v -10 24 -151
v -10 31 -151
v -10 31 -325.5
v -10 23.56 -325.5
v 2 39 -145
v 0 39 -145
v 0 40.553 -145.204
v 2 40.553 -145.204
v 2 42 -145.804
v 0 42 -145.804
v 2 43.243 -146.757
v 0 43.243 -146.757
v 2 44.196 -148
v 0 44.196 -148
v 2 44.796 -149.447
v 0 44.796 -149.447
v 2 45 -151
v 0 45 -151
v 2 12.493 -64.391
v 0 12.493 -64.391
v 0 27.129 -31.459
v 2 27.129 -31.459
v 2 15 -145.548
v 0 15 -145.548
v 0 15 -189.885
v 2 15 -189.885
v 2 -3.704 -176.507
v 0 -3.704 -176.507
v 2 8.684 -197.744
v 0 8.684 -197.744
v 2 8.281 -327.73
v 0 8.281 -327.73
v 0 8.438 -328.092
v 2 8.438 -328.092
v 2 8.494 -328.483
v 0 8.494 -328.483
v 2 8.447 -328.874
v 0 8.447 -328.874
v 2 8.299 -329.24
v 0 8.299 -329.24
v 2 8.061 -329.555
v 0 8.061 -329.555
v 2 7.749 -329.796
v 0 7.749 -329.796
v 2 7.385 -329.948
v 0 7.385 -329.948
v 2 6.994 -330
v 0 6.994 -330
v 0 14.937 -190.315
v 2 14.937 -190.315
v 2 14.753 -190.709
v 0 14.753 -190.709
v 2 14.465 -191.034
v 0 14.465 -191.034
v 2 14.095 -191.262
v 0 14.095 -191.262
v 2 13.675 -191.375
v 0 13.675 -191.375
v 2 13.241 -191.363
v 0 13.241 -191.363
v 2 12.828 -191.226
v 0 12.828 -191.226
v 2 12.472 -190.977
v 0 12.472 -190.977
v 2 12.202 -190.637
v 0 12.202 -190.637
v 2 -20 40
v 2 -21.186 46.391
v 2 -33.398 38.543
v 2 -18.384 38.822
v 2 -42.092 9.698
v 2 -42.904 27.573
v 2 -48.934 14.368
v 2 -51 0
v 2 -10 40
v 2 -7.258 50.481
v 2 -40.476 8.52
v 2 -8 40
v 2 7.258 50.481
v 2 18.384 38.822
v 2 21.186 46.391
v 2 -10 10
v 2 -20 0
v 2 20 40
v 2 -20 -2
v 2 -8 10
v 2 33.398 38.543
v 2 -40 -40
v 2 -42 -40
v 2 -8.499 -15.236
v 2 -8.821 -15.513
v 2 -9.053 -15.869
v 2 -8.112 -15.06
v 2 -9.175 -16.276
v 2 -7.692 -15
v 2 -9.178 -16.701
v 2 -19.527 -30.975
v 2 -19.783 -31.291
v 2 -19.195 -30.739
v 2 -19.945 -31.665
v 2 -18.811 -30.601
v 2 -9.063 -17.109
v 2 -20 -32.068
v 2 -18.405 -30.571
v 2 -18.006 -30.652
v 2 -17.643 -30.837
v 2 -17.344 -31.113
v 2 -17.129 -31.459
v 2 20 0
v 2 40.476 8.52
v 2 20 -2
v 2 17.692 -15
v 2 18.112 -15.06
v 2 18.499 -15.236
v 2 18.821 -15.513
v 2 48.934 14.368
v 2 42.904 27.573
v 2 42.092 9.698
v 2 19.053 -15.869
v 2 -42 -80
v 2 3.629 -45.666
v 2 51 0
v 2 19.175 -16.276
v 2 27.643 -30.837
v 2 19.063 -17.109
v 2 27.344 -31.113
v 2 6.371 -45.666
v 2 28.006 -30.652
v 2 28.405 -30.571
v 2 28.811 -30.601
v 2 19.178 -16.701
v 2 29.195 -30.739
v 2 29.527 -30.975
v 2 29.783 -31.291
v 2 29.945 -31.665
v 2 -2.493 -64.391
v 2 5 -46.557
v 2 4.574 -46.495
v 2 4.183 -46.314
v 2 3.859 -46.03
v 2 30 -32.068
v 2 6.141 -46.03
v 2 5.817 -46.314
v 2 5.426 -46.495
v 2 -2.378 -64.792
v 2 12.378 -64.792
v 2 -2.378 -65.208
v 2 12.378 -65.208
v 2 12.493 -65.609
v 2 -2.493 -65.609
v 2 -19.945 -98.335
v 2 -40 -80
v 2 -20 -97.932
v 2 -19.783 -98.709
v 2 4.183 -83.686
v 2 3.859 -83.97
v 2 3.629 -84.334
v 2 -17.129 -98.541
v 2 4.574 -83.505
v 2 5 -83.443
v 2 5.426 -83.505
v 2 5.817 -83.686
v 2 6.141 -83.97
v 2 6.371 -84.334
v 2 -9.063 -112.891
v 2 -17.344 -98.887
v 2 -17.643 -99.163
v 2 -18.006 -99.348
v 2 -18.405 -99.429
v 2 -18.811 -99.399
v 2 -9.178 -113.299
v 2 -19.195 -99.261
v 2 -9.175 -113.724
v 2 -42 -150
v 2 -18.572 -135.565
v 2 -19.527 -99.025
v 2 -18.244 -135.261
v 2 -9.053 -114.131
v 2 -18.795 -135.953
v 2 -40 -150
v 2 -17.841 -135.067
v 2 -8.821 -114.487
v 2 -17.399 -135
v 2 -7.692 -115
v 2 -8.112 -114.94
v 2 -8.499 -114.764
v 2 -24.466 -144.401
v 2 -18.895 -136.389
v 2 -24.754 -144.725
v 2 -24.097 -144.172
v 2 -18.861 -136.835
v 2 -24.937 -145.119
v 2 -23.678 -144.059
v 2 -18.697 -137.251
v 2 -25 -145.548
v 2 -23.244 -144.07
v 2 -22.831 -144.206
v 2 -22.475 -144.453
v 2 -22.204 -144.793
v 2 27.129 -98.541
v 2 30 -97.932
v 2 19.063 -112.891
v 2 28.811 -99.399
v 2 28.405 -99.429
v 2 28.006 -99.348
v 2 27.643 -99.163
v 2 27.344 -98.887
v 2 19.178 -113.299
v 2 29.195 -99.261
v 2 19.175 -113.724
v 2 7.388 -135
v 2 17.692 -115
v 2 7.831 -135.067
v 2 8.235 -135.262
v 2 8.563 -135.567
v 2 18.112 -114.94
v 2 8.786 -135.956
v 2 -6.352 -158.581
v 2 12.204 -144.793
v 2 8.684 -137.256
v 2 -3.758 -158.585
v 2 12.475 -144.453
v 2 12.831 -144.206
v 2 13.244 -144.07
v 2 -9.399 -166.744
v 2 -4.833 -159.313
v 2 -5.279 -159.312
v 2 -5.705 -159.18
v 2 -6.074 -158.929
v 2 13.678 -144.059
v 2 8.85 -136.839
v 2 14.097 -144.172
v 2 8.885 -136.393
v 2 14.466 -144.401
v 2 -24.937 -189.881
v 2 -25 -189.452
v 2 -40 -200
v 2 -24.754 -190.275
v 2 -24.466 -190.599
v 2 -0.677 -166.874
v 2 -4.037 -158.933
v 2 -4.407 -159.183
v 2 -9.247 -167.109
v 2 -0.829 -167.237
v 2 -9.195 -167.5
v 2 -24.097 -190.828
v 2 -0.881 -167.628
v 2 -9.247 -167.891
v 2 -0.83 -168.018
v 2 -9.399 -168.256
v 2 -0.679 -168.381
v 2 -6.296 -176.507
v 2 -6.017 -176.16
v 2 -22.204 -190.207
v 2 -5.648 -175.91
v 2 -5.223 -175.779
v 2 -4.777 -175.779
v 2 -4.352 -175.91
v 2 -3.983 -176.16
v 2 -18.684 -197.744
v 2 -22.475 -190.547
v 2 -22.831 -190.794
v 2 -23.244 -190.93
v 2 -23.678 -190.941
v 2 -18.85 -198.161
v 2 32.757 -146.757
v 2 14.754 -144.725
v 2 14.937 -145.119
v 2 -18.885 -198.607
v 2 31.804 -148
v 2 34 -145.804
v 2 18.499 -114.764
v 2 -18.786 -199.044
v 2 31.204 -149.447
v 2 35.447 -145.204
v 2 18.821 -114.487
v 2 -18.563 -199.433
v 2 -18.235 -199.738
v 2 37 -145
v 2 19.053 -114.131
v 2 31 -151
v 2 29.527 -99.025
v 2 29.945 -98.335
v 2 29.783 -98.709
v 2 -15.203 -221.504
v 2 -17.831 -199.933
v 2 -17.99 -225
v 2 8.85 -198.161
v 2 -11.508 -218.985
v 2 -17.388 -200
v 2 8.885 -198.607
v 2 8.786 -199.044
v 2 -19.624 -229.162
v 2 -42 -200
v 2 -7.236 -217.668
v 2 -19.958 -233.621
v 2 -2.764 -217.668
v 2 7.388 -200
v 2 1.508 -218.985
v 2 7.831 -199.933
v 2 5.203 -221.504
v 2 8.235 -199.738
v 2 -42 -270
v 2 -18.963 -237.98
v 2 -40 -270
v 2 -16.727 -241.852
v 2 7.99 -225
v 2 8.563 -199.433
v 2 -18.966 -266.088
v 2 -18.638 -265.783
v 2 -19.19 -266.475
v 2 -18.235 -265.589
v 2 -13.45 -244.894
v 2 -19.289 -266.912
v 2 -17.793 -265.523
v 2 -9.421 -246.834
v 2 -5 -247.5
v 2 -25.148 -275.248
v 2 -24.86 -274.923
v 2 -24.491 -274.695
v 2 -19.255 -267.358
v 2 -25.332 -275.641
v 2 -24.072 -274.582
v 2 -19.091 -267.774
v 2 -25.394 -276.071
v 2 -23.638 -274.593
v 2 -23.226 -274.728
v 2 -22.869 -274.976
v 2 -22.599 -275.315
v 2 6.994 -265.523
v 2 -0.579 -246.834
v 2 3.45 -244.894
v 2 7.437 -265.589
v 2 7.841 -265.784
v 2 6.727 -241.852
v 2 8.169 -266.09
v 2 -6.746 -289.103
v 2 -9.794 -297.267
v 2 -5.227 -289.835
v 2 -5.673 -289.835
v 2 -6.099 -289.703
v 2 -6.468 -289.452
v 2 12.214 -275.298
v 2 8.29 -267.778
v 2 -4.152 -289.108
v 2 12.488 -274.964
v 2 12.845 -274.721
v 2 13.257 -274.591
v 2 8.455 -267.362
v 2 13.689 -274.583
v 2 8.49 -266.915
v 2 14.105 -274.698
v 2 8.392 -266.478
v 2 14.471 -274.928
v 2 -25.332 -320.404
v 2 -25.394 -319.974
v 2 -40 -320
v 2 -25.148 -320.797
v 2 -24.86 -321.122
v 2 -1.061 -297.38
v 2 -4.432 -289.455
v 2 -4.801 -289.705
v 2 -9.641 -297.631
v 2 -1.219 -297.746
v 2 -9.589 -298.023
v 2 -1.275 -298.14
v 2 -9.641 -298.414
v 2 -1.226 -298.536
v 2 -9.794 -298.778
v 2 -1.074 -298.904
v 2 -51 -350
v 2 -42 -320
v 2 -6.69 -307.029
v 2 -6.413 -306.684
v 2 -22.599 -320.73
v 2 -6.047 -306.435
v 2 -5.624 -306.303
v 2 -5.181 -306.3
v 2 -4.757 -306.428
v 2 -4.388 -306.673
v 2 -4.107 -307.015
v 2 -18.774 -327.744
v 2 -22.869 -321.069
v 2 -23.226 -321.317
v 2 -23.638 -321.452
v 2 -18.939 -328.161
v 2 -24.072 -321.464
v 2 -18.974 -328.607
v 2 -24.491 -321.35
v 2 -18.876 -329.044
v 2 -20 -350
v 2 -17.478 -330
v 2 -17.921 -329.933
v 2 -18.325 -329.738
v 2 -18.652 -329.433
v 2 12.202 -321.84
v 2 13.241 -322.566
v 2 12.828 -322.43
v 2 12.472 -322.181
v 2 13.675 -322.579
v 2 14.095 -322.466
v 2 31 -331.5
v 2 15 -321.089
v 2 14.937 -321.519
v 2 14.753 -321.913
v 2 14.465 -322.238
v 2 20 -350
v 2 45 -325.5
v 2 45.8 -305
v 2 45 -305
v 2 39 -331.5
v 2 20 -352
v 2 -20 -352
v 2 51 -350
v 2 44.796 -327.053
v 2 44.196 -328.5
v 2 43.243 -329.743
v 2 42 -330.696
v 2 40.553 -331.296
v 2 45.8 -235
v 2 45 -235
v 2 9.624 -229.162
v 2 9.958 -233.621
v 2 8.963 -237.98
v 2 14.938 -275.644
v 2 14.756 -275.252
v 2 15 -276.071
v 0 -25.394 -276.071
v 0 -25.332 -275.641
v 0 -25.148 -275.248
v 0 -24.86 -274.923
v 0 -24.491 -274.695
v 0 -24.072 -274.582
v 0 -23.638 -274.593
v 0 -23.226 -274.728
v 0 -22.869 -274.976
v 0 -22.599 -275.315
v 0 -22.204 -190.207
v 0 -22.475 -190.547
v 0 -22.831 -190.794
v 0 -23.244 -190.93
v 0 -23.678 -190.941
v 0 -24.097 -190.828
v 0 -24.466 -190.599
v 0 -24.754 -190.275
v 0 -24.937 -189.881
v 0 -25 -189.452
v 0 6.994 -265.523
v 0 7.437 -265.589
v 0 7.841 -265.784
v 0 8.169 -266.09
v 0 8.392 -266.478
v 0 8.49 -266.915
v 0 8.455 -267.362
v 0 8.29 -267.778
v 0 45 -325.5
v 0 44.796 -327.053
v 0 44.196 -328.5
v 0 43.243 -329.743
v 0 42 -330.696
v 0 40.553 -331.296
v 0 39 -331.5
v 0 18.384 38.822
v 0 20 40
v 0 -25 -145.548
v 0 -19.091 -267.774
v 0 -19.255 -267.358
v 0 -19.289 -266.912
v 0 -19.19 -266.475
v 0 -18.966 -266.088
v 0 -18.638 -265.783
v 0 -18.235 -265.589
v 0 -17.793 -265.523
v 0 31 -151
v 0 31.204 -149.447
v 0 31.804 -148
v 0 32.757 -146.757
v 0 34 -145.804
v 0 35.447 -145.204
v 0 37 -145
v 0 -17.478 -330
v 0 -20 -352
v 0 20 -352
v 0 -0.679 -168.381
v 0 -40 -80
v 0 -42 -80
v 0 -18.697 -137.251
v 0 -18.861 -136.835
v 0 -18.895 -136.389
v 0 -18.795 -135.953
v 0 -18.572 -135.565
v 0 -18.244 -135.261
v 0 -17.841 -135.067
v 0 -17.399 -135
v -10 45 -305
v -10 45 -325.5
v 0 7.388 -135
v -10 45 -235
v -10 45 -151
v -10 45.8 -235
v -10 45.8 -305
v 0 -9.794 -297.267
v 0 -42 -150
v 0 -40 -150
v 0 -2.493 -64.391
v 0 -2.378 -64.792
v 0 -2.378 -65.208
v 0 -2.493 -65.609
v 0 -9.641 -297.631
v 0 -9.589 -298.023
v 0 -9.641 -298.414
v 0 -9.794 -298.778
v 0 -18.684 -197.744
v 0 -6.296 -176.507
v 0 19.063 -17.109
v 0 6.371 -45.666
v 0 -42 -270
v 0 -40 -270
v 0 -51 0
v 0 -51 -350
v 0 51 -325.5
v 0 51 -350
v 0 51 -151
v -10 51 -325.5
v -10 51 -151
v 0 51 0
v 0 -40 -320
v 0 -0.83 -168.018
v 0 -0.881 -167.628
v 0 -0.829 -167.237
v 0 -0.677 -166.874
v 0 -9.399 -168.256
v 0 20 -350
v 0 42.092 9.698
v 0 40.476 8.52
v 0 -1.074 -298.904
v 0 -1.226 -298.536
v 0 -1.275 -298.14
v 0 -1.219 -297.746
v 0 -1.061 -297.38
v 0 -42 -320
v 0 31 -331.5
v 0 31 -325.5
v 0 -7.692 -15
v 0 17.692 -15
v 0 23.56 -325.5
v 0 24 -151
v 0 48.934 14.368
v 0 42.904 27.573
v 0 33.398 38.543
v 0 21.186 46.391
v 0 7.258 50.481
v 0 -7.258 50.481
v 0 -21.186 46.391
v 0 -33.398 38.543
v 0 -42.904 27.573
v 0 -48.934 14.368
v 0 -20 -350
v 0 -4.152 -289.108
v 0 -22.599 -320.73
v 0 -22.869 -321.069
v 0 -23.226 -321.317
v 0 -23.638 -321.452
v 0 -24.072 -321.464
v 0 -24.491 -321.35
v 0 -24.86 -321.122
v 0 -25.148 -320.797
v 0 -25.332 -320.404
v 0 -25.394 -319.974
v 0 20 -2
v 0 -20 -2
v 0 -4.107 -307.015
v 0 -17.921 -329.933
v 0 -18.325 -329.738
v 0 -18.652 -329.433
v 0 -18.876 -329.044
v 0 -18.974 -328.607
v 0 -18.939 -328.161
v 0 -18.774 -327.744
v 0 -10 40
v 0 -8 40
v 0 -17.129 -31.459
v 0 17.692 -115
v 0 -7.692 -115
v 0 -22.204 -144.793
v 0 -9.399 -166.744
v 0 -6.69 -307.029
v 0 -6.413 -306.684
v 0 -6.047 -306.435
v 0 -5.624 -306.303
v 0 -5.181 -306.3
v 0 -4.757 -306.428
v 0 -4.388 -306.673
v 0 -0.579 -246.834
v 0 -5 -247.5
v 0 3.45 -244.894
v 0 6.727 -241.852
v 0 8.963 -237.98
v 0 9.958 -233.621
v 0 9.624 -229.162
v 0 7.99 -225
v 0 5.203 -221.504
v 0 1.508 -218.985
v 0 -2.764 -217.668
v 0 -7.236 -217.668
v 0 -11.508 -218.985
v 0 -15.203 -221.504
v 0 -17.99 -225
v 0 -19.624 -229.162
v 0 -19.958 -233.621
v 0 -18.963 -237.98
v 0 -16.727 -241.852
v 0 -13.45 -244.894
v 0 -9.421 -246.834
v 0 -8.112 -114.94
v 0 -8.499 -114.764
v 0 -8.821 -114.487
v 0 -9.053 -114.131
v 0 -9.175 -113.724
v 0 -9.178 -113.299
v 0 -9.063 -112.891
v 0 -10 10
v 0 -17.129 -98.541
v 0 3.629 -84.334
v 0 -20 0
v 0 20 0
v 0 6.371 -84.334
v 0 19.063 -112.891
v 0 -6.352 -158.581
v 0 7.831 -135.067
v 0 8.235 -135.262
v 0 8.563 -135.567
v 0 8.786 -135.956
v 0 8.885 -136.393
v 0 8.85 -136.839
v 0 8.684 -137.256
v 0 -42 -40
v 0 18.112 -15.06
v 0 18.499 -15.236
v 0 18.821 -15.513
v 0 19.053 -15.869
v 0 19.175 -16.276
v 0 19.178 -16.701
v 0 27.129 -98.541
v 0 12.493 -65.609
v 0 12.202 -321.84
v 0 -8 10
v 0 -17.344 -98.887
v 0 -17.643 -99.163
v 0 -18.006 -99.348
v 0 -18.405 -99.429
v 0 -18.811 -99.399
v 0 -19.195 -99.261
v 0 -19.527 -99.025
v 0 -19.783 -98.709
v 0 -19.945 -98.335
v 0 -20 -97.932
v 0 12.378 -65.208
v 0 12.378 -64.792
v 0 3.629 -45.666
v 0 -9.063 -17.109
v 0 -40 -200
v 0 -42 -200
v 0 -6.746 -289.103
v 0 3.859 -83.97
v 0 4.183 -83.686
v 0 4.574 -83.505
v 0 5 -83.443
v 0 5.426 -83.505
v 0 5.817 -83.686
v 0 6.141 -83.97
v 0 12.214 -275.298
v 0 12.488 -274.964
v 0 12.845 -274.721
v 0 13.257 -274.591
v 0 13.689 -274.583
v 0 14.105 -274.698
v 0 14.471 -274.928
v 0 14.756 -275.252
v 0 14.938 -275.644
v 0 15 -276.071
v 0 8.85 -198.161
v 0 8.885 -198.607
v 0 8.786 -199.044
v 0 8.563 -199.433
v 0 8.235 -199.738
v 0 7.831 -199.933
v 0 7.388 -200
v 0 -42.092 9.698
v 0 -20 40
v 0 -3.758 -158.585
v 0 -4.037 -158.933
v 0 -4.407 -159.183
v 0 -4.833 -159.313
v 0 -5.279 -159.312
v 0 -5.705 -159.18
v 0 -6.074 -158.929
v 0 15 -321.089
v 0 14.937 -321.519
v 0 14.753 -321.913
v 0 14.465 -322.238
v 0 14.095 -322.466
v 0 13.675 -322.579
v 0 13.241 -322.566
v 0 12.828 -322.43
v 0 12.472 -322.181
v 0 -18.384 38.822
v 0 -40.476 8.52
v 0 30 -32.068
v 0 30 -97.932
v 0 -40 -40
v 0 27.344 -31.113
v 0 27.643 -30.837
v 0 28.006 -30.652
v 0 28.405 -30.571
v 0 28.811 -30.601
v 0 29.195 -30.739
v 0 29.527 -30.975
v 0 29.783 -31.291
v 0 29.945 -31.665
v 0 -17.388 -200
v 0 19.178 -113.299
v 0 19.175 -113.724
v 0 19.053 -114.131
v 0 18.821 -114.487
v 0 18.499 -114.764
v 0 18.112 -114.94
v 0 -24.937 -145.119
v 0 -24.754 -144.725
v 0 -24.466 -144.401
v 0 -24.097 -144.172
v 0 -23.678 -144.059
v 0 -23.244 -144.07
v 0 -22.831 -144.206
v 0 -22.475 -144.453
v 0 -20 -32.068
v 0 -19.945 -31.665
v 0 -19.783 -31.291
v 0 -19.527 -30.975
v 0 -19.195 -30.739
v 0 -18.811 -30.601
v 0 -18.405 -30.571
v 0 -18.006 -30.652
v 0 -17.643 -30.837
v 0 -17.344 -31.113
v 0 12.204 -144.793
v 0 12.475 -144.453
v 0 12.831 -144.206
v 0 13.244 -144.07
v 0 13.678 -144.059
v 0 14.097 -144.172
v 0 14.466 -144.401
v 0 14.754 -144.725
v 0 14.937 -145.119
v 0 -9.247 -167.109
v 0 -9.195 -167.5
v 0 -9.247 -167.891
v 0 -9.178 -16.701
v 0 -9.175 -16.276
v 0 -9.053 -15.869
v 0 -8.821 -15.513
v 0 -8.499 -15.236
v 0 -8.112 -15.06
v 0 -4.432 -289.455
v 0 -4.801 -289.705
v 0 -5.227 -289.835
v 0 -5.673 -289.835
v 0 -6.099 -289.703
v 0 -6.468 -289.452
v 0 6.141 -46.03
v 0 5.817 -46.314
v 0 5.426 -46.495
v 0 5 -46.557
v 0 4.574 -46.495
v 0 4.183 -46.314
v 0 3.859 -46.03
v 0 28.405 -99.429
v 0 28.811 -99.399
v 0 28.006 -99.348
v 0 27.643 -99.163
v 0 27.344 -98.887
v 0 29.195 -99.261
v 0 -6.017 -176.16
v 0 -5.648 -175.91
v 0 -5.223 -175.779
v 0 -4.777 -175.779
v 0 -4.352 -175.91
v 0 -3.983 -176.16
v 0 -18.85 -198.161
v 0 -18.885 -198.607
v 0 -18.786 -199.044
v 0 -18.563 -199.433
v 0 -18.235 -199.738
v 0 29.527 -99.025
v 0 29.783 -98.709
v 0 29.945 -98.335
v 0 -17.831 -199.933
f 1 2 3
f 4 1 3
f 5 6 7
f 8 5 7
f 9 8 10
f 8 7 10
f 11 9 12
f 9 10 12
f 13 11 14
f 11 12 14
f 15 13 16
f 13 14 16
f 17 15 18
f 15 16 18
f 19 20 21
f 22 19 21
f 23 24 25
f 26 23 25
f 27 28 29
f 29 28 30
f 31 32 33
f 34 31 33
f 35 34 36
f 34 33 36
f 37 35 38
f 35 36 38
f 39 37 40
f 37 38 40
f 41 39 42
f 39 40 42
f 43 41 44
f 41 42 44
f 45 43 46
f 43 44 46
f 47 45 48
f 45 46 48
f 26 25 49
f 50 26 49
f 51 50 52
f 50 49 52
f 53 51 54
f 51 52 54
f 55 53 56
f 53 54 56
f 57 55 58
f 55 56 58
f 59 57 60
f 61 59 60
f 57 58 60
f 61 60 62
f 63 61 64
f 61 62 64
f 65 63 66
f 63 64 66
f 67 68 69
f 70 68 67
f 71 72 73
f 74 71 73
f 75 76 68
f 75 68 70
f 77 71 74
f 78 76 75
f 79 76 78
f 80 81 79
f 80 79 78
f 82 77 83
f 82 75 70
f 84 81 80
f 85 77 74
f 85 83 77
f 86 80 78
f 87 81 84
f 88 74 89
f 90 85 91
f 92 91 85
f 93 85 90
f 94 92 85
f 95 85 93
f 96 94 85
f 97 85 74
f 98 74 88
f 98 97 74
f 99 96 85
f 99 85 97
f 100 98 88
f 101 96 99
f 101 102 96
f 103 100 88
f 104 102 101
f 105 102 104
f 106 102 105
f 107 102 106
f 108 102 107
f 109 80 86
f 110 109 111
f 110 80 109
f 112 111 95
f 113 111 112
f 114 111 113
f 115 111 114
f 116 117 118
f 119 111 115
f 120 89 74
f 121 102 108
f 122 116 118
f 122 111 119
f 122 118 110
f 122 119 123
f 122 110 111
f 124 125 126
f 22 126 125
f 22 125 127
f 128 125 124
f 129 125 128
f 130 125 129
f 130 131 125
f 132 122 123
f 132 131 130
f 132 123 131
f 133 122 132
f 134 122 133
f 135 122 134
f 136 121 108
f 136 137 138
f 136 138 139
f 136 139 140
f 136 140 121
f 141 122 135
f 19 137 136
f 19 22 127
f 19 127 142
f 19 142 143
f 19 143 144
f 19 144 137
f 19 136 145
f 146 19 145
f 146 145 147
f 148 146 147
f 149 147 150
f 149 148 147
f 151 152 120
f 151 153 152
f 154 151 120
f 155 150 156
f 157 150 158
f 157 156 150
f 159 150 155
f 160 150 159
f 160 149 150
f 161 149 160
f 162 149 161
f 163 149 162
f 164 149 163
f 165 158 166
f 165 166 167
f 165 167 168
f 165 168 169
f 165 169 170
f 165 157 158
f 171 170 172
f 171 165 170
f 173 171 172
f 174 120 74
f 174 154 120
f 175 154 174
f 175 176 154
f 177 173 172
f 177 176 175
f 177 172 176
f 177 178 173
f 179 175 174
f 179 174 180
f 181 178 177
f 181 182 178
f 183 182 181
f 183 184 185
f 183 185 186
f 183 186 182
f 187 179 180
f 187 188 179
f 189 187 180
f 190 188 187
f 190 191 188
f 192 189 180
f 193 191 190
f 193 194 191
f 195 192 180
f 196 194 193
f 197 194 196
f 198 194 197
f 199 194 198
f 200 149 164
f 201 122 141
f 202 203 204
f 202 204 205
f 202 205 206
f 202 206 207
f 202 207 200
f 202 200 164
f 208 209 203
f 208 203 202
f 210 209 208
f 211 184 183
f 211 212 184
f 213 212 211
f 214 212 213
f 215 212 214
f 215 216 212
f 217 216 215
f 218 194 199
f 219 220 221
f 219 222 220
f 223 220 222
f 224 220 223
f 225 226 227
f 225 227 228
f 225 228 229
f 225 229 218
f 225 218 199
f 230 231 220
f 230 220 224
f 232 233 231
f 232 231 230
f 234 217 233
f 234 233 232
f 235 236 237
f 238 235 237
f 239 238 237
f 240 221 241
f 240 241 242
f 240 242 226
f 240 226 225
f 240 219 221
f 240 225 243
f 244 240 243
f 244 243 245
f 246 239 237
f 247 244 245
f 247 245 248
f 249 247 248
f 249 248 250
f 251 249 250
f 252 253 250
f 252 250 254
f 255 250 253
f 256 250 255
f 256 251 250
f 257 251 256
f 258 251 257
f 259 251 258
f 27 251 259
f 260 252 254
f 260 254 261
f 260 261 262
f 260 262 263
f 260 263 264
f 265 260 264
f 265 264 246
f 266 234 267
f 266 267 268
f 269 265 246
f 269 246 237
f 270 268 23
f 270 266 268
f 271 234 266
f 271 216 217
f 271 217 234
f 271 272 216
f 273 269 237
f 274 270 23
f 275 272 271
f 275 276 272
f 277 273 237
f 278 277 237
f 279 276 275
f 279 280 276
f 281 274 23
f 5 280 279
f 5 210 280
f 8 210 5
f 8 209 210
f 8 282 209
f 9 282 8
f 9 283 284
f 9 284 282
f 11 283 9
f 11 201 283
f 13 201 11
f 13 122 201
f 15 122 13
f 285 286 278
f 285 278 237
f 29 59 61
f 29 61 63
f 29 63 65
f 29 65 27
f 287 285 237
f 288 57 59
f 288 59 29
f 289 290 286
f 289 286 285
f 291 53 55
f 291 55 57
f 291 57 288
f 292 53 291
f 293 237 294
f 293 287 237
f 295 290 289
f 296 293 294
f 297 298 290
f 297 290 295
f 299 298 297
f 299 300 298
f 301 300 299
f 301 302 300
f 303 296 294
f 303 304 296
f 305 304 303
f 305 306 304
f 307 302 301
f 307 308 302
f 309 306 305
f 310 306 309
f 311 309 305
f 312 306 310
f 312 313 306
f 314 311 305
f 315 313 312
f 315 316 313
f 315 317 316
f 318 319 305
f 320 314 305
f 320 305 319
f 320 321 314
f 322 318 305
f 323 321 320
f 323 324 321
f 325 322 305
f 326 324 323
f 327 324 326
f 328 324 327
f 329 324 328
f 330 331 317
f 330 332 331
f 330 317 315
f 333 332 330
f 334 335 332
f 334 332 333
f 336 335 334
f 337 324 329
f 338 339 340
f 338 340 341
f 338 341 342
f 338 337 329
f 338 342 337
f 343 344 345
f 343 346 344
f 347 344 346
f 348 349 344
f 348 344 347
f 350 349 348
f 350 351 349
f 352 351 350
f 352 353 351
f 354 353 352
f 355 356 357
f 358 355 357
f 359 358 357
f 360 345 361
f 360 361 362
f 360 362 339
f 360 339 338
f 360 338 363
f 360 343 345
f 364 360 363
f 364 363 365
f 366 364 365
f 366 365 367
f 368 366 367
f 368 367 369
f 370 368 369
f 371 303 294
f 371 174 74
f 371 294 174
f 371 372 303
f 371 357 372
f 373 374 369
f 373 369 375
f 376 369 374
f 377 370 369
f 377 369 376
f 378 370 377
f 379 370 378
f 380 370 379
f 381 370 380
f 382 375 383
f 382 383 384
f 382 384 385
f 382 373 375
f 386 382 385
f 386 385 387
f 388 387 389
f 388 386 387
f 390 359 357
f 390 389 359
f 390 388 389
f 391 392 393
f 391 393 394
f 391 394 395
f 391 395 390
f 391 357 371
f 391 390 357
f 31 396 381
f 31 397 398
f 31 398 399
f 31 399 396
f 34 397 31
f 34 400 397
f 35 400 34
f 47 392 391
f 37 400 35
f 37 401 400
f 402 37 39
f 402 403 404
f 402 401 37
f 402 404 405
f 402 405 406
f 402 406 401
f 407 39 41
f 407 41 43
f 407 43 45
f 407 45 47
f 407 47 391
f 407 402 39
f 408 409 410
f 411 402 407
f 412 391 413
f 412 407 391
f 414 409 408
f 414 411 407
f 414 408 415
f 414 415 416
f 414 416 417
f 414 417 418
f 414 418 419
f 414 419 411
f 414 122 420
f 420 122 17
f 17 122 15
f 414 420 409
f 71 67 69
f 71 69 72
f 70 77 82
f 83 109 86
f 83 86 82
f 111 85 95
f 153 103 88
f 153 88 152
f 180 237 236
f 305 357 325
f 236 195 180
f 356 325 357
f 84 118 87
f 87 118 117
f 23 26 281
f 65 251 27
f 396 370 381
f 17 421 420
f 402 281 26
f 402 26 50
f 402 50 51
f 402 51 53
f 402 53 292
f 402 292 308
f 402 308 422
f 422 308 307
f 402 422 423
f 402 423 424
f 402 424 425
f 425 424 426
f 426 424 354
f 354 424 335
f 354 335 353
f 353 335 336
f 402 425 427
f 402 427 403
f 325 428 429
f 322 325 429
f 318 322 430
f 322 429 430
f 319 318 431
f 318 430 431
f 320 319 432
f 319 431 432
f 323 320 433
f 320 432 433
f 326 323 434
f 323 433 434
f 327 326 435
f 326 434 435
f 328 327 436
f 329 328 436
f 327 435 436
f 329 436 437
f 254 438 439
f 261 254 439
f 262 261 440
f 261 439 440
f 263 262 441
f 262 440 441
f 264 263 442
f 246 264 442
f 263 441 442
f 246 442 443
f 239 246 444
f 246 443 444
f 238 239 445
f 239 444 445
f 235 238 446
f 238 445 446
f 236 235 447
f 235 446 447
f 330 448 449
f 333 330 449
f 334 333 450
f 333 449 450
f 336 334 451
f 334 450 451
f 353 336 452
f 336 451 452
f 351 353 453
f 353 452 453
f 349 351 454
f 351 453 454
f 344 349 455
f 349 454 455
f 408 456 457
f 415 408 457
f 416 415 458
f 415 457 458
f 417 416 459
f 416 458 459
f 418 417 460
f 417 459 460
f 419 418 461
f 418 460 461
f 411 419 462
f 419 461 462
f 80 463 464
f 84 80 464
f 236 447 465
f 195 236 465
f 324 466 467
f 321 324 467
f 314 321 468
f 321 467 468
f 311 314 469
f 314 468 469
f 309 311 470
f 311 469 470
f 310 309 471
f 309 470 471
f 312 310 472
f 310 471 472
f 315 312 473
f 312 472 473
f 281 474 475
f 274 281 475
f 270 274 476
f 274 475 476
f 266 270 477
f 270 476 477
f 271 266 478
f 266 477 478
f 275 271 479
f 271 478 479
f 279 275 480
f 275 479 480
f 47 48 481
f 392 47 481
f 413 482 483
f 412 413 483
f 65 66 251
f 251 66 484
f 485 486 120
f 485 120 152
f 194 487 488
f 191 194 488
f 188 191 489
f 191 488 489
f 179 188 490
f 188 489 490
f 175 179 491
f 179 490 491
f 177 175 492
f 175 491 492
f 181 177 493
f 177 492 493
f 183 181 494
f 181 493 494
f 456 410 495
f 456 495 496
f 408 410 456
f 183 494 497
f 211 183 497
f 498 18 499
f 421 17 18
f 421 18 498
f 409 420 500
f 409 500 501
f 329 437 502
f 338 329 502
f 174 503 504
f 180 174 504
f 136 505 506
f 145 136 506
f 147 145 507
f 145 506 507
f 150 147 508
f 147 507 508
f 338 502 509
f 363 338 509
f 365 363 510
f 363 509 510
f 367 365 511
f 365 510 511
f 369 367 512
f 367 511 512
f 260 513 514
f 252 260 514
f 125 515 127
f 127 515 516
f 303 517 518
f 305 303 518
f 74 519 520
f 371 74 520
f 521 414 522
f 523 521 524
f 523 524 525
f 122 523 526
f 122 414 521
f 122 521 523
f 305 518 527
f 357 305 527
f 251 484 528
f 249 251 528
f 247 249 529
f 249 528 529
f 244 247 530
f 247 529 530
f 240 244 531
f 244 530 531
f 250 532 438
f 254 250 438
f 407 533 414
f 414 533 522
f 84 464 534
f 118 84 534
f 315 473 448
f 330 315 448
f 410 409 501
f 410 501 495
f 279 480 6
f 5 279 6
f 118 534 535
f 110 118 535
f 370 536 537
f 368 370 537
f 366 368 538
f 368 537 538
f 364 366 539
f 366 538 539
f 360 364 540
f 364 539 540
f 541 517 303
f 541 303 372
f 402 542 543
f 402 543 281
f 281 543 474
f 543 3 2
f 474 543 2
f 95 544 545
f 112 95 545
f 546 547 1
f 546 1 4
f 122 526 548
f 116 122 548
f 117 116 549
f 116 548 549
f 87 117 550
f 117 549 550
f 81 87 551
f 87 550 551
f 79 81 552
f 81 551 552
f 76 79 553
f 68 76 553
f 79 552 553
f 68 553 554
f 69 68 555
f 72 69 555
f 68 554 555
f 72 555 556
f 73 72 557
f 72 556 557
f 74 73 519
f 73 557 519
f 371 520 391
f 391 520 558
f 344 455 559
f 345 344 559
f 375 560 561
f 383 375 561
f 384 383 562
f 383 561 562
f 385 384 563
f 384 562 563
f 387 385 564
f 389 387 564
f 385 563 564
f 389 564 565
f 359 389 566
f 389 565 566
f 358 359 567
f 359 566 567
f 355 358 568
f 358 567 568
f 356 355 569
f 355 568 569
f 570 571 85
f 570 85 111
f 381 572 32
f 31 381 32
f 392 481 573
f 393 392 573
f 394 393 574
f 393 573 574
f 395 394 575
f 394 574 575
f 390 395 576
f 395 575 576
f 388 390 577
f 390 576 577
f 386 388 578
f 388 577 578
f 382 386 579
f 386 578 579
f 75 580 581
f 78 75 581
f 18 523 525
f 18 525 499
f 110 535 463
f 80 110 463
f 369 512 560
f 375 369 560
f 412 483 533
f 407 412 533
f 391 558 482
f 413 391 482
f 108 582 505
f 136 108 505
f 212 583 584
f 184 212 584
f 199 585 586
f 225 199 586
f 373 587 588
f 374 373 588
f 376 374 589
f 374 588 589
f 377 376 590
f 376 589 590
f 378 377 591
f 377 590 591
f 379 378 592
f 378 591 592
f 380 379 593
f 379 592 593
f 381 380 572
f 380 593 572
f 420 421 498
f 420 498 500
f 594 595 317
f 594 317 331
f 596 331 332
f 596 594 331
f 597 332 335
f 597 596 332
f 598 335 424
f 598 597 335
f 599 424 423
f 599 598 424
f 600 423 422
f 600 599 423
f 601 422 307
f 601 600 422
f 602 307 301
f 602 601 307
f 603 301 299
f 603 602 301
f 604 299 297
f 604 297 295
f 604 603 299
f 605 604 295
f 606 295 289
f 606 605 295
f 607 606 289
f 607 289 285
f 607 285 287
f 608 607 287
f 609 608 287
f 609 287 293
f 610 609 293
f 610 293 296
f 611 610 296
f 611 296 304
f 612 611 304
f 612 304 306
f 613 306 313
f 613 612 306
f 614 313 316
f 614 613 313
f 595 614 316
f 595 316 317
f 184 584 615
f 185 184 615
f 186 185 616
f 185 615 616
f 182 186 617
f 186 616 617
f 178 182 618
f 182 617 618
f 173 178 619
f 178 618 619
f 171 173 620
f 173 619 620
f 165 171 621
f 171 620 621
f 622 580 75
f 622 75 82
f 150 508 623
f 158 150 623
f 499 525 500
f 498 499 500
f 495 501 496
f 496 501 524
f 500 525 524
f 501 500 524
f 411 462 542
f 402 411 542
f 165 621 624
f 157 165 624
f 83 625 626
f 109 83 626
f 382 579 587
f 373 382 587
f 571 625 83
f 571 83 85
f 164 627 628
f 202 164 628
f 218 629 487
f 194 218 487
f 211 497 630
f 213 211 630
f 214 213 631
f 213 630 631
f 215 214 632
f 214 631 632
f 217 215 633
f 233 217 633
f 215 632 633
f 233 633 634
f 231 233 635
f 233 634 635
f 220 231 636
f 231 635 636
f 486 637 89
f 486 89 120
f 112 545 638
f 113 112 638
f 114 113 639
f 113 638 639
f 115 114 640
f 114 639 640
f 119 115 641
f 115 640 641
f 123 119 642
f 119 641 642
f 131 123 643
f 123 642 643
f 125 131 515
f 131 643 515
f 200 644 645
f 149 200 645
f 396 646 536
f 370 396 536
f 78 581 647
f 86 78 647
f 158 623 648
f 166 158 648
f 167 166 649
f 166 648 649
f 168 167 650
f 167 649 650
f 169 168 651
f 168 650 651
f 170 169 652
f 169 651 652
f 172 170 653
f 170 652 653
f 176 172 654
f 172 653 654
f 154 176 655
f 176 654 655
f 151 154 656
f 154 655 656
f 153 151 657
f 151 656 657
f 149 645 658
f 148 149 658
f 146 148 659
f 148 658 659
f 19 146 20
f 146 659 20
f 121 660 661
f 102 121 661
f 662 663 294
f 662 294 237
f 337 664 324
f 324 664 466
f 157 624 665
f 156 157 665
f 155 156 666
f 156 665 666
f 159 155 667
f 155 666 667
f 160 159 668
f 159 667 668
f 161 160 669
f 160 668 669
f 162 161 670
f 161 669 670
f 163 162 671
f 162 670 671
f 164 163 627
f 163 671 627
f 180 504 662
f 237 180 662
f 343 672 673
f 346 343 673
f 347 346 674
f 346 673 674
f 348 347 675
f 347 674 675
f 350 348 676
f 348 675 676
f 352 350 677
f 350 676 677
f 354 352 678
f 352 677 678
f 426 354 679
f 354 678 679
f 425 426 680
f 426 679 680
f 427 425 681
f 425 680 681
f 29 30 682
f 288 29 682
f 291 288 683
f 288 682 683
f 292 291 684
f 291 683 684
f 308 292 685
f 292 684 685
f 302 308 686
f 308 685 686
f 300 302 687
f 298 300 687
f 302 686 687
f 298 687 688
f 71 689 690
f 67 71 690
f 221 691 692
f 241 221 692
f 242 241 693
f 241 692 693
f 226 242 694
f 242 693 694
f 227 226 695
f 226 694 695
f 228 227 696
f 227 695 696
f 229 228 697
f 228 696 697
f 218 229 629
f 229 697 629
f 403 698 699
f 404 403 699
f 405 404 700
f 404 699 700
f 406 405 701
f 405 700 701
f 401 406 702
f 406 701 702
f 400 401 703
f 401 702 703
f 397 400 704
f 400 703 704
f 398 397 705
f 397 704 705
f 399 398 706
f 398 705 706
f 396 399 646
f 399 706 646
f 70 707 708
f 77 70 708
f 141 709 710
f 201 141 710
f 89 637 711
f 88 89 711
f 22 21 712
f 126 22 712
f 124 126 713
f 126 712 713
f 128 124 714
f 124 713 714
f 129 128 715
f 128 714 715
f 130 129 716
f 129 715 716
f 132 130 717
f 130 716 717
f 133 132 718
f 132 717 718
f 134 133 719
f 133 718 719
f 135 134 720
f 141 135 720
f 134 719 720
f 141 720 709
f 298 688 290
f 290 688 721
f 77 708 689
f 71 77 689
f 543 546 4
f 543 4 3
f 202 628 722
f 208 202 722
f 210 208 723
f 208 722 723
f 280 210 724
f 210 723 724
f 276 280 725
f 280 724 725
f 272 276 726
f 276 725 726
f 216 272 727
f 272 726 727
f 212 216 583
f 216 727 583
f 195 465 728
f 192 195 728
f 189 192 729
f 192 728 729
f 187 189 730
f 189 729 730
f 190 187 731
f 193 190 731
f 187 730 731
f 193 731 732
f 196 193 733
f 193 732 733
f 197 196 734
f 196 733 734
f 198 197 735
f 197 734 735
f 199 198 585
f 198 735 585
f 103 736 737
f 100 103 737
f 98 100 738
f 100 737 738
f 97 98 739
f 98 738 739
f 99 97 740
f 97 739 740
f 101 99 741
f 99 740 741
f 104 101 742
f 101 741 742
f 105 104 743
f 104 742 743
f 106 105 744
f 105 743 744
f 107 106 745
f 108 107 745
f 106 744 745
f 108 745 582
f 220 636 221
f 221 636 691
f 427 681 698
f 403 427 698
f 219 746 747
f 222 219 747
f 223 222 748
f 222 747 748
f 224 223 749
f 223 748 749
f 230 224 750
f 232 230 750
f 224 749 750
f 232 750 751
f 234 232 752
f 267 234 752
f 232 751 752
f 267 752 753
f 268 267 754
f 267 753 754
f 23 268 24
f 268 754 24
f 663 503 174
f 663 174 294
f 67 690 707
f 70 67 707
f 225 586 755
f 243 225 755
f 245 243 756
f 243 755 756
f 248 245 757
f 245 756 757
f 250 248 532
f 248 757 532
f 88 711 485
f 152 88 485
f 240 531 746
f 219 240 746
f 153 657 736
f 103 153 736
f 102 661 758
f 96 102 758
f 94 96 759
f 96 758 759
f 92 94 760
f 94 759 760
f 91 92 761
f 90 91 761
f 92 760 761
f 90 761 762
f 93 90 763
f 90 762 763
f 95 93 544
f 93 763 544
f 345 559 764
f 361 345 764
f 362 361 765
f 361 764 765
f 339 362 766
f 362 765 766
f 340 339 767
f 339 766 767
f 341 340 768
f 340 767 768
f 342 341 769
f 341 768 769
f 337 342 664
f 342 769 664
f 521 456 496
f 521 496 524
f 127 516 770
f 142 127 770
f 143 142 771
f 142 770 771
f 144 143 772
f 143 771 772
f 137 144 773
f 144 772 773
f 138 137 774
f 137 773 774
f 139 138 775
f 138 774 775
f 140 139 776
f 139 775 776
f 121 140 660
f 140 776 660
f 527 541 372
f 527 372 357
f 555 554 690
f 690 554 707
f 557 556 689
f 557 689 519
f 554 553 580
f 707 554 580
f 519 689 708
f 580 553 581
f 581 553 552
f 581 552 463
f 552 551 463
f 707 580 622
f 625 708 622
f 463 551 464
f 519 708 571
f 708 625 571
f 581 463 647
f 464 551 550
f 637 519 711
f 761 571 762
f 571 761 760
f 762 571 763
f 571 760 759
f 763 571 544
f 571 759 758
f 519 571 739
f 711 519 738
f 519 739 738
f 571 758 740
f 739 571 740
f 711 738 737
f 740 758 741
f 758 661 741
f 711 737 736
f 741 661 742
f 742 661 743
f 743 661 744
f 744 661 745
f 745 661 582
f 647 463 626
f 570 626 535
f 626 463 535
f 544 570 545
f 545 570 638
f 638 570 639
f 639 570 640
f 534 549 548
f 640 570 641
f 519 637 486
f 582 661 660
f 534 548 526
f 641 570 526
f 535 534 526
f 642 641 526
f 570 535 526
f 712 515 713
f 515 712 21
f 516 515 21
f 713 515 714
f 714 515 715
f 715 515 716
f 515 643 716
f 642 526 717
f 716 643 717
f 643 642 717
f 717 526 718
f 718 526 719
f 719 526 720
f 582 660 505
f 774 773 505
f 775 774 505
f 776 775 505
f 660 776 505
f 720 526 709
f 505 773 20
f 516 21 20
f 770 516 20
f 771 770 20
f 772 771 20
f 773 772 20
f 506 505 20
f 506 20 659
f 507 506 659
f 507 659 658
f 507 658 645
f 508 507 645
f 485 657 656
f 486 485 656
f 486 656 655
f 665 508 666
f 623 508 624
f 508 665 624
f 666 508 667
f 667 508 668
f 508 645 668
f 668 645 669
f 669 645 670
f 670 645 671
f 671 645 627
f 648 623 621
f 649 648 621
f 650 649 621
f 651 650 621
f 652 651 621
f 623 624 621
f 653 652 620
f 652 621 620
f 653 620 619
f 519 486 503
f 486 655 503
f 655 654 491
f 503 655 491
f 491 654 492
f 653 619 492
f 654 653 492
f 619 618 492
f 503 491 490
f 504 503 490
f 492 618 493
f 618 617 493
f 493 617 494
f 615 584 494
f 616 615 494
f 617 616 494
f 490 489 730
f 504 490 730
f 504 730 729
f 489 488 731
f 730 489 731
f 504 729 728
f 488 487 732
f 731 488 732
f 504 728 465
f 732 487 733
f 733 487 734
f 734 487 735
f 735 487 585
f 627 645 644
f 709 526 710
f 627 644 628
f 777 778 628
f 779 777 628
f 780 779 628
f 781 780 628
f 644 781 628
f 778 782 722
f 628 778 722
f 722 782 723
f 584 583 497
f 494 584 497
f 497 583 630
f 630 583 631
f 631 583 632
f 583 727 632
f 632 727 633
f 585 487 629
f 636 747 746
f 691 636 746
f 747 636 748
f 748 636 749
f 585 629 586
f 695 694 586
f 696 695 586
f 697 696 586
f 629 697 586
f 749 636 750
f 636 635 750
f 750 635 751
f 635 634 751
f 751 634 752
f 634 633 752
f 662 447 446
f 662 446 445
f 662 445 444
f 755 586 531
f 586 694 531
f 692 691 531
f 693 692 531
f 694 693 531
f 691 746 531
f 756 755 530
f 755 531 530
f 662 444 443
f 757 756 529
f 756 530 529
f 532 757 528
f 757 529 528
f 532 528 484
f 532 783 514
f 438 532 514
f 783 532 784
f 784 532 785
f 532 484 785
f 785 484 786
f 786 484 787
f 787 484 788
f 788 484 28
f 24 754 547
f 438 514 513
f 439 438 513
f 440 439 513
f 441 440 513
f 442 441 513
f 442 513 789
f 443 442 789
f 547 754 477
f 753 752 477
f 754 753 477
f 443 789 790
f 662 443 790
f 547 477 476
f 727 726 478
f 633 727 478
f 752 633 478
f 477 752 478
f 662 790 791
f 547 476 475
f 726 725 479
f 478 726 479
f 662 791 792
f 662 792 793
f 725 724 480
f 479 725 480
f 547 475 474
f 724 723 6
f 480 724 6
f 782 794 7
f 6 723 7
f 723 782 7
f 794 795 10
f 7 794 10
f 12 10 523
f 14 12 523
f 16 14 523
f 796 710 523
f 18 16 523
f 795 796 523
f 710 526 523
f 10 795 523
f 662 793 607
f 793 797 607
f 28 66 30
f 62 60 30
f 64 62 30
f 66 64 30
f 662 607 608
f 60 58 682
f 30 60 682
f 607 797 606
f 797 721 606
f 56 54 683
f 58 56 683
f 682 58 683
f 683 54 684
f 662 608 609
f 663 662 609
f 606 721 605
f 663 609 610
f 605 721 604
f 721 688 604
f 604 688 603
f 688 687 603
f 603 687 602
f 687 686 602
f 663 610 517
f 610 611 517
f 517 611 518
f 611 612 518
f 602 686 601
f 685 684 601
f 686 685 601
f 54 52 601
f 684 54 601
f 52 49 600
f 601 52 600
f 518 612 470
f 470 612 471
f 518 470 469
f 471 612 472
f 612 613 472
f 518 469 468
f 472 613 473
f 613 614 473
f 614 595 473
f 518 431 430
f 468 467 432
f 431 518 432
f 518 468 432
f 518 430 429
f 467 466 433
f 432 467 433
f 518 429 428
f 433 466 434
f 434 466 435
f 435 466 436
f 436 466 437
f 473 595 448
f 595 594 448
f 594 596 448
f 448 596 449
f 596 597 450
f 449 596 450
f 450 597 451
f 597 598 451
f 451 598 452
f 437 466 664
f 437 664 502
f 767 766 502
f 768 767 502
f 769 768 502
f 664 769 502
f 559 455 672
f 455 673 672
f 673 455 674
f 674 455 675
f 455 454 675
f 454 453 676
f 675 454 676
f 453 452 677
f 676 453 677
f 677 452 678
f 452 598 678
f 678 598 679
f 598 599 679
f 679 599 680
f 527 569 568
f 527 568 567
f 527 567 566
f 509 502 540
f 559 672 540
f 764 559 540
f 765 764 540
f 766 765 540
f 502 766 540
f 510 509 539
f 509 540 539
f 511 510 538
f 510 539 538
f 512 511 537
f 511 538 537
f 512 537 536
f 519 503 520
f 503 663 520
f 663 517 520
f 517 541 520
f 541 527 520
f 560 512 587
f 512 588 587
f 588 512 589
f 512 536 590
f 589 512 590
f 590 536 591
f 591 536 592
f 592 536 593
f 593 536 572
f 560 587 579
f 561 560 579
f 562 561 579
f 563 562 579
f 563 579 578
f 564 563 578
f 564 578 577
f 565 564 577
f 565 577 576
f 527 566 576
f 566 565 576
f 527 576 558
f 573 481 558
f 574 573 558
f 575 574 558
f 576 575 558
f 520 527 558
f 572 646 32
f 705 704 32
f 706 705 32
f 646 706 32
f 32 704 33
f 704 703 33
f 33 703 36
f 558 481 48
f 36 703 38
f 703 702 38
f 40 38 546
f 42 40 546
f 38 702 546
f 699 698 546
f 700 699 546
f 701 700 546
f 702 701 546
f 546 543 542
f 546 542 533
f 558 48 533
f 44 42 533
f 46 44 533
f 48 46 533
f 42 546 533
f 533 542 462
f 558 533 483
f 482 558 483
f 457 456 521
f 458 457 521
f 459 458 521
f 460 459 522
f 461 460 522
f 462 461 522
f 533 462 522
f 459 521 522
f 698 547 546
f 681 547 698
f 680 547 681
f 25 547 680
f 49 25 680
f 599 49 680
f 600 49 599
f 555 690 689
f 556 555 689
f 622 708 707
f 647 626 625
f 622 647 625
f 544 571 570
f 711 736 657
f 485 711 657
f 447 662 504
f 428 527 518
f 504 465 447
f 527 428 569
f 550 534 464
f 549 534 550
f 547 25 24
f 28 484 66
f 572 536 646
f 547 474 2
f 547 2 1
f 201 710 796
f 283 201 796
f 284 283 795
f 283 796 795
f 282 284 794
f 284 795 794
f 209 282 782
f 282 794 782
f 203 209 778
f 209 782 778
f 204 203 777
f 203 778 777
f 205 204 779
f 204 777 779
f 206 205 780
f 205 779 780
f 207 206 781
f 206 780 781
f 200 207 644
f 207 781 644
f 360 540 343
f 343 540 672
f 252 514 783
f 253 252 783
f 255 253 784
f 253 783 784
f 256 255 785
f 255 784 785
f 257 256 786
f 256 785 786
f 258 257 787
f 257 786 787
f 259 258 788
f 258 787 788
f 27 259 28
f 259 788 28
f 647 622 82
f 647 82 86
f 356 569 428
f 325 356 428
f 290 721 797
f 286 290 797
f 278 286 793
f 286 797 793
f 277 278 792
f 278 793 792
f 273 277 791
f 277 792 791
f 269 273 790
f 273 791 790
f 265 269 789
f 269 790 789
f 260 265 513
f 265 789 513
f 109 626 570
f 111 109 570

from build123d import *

# Parameters (mm, degrees)
SKETCH_1_W      = 2
SKETCH_1_H      = 40
SKETCH_1_W_2    = 40
SKETCH_1_H_2    = 2
SKETCH_1_W_3    = 50
SKETCH_1_R      = 15
SKETCH_1_W_4    = 30
EXTRUDE_3_DEPTH = 2
EXTRUDE_4_DEPTH = 10


with BuildPart() as part:
    # 草图1 → 凸台-拉伸3 (new body)
    with BuildSketch(Plane(origin=(0, 0, 0), x_dir=(0, 0, -1), z_dir=(1, 0, 0))):
        with BuildLine():
            Line((350, 51), (0, 51))
            ThreePointArc((0, 51), (-51, 0), (0, -51))
            Line((0, -51), (350, -51))
            Line((350, -51), (350, -20))
            Line((350, -20), (352, -20))
            Line((352, -20), (352, 20))
            Line((352, 20), (350, 20))
            Line((350, 20), (350, 51))
        make_face()
        with BuildLine():
            ThreePointArc((145, 39), (146.757359313, 43.242640687), (151, 45))
            Line((151, 45), (235, 45))
            Line((235, 45), (235, 45.8))
            Line((235, 45.8), (305, 45.8))
            Line((305, 45.8), (305, 45))
            Line((305, 45), (325.5, 45))
            ThreePointArc((325.5, 45), (329.742640687, 43.242640687), (331.5, 39))
            Line((331.5, 39), (331.5, 31))
            Line((331.5, 31), (151, 31))
            ThreePointArc((151, 31), (146.757359313, 32.757359313), (145, 37))
            Line((145, 37), (145, 39))
        make_face(mode=Mode.SUBTRACT)
        with Locations((1, 0)):
            Rectangle(SKETCH_1_W, SKETCH_1_H, mode=Mode.SUBTRACT)
        with Locations((60, -41)):
            Rectangle(SKETCH_1_W_2, SKETCH_1_H_2, mode=Mode.SUBTRACT)
        with BuildLine():
            Line((97.931678324, -20), (32.068321676, -20))
            ThreePointArc((32.068321676, -20), (30.600998265, -18.811387231), (31.459113977, -17.129282677))
            Line((31.459113977, -17.129282677), (64.390792301, -2.4929812))
            ThreePointArc((64.390792301, -2.4929812), (65, -2.363698523), (65.609207699, -2.4929812))
            Line((65.609207699, -2.4929812), (98.540886023, -17.129282677))
            ThreePointArc((98.540886023, -17.129282677), (99.399001735, -18.811387231), (97.931678324, -20))
        make_face(mode=Mode.SUBTRACT)
        with BuildLine():
            Line((135, -17.39868764), (135, 7.388444501))
            ThreePointArc((135, 7.388444501), (135.75290891, 8.68915773), (137.255806538, 8.684112853))
            Line((137.255806538, 8.684112853), (158.585016393, -3.757926229))
            ThreePointArc((158.585016393, -3.757926229), (159.329207689, -5.056143052), (158.580609404, -6.35182365))
            Line((158.580609404, -6.35182365), (137.25139955, -18.69691671))
            ThreePointArc((137.25139955, -18.69691671), (135.750700102, -18.698129698), (135, -17.39868764))
        make_face(mode=Mode.SUBTRACT)
        with Locations((175, -41)):
            Rectangle(SKETCH_1_W_3, SKETCH_1_H_2, mode=Mode.SUBTRACT)
        with Locations((295, -41)):
            Rectangle(SKETCH_1_W_3, SKETCH_1_H_2, mode=Mode.SUBTRACT)
        with BuildLine():
            Line((189.451619145, -25), (145.548380855, -25))
            ThreePointArc((145.548380855, -25), (144.100364535, -23.891469969), (144.792574317, -22.204331649))
            Line((144.792574317, -22.204331649), (166.744193462, -9.399220481))
            ThreePointArc((166.744193462, -9.399220481), (167.5, -9.194888832), (168.255806538, -9.399220481))
            Line((168.255806538, -9.399220481), (190.207425683, -22.204331649))
            ThreePointArc((190.207425683, -22.204331649), (190.899635465, -23.891469969), (189.451619145, -25))
        make_face(mode=Mode.SUBTRACT)
        with BuildLine():
            ThreePointArc((197.744193462, 8.684112853), (199.24709109, 8.68915773), (200, 7.388444501))
            Line((200, 7.388444501), (200, -17.388444501))
            ThreePointArc((200, -17.388444501), (199.24709109, -18.68915773), (197.744193462, -18.684112853))
            Line((197.744193462, -18.684112853), (176.506860031, -6.295668351))
            ThreePointArc((176.506860031, -6.295668351), (175.762666569, -5), (176.506860031, -3.704331649))
            Line((176.506860031, -3.704331649), (197.744193462, 8.684112853))
        make_face(mode=Mode.SUBTRACT)
        with Locations((232.5, -5)):
            Circle(SKETCH_1_R, mode=Mode.SUBTRACT)
        with BuildLine():
            Line((319.974166797, -25.394327939), (276.070928507, -25.394327939))
            ThreePointArc((276.070928507, -25.394327939), (274.622912187, -24.285797907), (275.315121969, -22.598659587))
            Line((275.315121969, -22.598659587), (297.266741114, -9.793548419))
            ThreePointArc((297.266741114, -9.793548419), (298.022547652, -9.589216771), (298.778354191, -9.793548419))
            Line((298.778354191, -9.793548419), (320.729973336, -22.598659587))
            ThreePointArc((320.729973336, -22.598659587), (321.422183118, -24.285797907), (319.974166797, -25.394327939))
        make_face(mode=Mode.SUBTRACT)
        with BuildLine():
            Line((265.522547652, -17.793015579), (265.522547652, 6.994116563))
            ThreePointArc((265.522547652, 6.994116563), (266.275456563, 8.294829792), (267.778354191, 8.289784914))
            Line((267.778354191, 8.289784914), (289.107564045, -4.152254168))
            ThreePointArc((289.107564045, -4.152254168), (289.851755342, -5.45047099), (289.103157056, -6.746151588))
            Line((289.103157056, -6.746151588), (267.773947202, -19.091244648))
            ThreePointArc((267.773947202, -19.091244648), (266.273247754, -19.092457637), (265.522547652, -17.793015579))
        make_face(mode=Mode.SUBTRACT)
        with BuildLine():
            ThreePointArc((327.730104505, 8.28146303), (329.239985391, 8.298885363), (330, 6.994116563))
            Line((330, 6.994116563), (330, -17.477952976))
            ThreePointArc((330, -17.477952976), (329.24709109, -18.778666205), (327.744193462, -18.773621327))
            Line((327.744193462, -18.773621327), (307.029407683, -6.68999629))
            ThreePointArc((307.029407683, -6.68999629), (306.285236534, -5.40250951), (307.015318726, -4.106981472))
            Line((307.015318726, -4.106981472), (327.730104505, 8.28146303))
        make_face(mode=Mode.SUBTRACT)
        with BuildLine():
            Line((15, -7.691857033), (15, 17.691857033))
            ThreePointArc((15, 17.691857033), (15.682629689, 18.94959539), (17.109207699, 19.062574356))
            Line((17.109207699, 19.062574356), (45.665886023, 6.370717323))
            ThreePointArc((45.665886023, 6.370717323), (46.556678324, 5), (45.665886023, 3.629282677))
            Line((45.665886023, 3.629282677), (17.109207699, -9.062574356))
            ThreePointArc((17.109207699, -9.062574356), (15.682629689, -8.94959539), (15, -7.691857033))
        make_face(mode=Mode.SUBTRACT)
        with BuildLine():
            Line((112.890792301, -9.062574356), (84.334113977, 3.629282677))
            ThreePointArc((84.334113977, 3.629282677), (83.443321676, 5), (84.334113977, 6.370717323))
            Line((84.334113977, 6.370717323), (112.890792301, 19.062574356))
            ThreePointArc((112.890792301, 19.062574356), (114.317370311, 18.94959539), (115, 17.691857033))
            Line((115, 17.691857033), (115, -7.691857033))
            ThreePointArc((115, -7.691857033), (114.317370311, -8.94959539), (112.890792301, -9.062574356))
        make_face(mode=Mode.SUBTRACT)
        with BuildLine():
            ThreePointArc((31.459113977, 27.129282677), (30.600998265, 28.811387231), (32.068321676, 30))
            Line((32.068321676, 30), (97.931678324, 30))
            ThreePointArc((97.931678324, 30), (99.399001735, 28.811387231), (98.540886023, 27.129282677))
            Line((98.540886023, 27.129282677), (65.609207699, 12.4929812))
            ThreePointArc((65.609207699, 12.4929812), (65, 12.363698523), (64.390792301, 12.4929812))
            Line((64.390792301, 12.4929812), (31.459113977, 27.129282677))
        make_face(mode=Mode.SUBTRACT)
        with BuildLine():
            ThreePointArc((144.792574317, 12.204331649), (144.100364535, 13.891469969), (145.548380855, 15))
            Line((145.548380855, 15), (189.885145799, 15))
            ThreePointArc((189.885145799, 15), (191.333825129, 13.889009252), (190.636545348, 12.20177093))
            Line((190.636545348, 12.20177093), (168.381459159, -0.679208343))
            ThreePointArc((168.381459159, -0.679208343), (167.627511138, -0.880977109), (166.874253072, -0.676647625))
            Line((166.874253072, -0.676647625), (144.792574317, 12.204331649))
        make_face(mode=Mode.SUBTRACT)
        with BuildLine():
            ThreePointArc((275.298059327, 12.21443661), (274.625531488, 13.901032988), (276.070928507, 15))
            Line((276.070928507, 15), (321.088992758, 15))
            ThreePointArc((321.088992758, 15), (322.537672089, 13.889009252), (321.840392308, 12.20177093))
            Line((321.840392308, 12.20177093), (298.904006812, -1.073536282))
            ThreePointArc((298.904006812, -1.073536282), (298.140143671, -1.275255431), (297.379738082, -1.060870603))
            Line((297.379738082, -1.060870603), (275.298059327, 12.21443661))
        make_face(mode=Mode.SUBTRACT)
        Polygon((-40, 20), (-9.698170842, 42.091834457), (-8.519939671, 40.475736902), (-38.821768829, 18.383902445), align=None, mode=Mode.SUBTRACT)
        with Locations((-25, -9)):
            Rectangle(SKETCH_1_W_4, SKETCH_1_H_2, mode=Mode.SUBTRACT)
        Polygon((-40, -20), (-38.821768829, -18.383902445), (-8.519939671, -40.475736902), (-9.698170842, -42.091834457), align=None, mode=Mode.SUBTRACT)
    extrude(amount=EXTRUDE_3_DEPTH)

    # 草图2 → 凸台-拉伸4 (add)
    with BuildSketch(Plane(origin=(0, 0, 0), x_dir=(0, 0, -1), z_dir=(1, 0, 0))):
        Polygon((151, 51), (151, 45), (235, 45), (235, 45.8), (305, 45.8), (305, 45), (325.5, 45), (325.5, 51), align=None)
        Polygon((325.5, 31), (151, 31), (151, 24), (325.5, 23.560383637), align=None)
    extrude(amount=-EXTRUDE_4_DEPTH)


solid = part.part
